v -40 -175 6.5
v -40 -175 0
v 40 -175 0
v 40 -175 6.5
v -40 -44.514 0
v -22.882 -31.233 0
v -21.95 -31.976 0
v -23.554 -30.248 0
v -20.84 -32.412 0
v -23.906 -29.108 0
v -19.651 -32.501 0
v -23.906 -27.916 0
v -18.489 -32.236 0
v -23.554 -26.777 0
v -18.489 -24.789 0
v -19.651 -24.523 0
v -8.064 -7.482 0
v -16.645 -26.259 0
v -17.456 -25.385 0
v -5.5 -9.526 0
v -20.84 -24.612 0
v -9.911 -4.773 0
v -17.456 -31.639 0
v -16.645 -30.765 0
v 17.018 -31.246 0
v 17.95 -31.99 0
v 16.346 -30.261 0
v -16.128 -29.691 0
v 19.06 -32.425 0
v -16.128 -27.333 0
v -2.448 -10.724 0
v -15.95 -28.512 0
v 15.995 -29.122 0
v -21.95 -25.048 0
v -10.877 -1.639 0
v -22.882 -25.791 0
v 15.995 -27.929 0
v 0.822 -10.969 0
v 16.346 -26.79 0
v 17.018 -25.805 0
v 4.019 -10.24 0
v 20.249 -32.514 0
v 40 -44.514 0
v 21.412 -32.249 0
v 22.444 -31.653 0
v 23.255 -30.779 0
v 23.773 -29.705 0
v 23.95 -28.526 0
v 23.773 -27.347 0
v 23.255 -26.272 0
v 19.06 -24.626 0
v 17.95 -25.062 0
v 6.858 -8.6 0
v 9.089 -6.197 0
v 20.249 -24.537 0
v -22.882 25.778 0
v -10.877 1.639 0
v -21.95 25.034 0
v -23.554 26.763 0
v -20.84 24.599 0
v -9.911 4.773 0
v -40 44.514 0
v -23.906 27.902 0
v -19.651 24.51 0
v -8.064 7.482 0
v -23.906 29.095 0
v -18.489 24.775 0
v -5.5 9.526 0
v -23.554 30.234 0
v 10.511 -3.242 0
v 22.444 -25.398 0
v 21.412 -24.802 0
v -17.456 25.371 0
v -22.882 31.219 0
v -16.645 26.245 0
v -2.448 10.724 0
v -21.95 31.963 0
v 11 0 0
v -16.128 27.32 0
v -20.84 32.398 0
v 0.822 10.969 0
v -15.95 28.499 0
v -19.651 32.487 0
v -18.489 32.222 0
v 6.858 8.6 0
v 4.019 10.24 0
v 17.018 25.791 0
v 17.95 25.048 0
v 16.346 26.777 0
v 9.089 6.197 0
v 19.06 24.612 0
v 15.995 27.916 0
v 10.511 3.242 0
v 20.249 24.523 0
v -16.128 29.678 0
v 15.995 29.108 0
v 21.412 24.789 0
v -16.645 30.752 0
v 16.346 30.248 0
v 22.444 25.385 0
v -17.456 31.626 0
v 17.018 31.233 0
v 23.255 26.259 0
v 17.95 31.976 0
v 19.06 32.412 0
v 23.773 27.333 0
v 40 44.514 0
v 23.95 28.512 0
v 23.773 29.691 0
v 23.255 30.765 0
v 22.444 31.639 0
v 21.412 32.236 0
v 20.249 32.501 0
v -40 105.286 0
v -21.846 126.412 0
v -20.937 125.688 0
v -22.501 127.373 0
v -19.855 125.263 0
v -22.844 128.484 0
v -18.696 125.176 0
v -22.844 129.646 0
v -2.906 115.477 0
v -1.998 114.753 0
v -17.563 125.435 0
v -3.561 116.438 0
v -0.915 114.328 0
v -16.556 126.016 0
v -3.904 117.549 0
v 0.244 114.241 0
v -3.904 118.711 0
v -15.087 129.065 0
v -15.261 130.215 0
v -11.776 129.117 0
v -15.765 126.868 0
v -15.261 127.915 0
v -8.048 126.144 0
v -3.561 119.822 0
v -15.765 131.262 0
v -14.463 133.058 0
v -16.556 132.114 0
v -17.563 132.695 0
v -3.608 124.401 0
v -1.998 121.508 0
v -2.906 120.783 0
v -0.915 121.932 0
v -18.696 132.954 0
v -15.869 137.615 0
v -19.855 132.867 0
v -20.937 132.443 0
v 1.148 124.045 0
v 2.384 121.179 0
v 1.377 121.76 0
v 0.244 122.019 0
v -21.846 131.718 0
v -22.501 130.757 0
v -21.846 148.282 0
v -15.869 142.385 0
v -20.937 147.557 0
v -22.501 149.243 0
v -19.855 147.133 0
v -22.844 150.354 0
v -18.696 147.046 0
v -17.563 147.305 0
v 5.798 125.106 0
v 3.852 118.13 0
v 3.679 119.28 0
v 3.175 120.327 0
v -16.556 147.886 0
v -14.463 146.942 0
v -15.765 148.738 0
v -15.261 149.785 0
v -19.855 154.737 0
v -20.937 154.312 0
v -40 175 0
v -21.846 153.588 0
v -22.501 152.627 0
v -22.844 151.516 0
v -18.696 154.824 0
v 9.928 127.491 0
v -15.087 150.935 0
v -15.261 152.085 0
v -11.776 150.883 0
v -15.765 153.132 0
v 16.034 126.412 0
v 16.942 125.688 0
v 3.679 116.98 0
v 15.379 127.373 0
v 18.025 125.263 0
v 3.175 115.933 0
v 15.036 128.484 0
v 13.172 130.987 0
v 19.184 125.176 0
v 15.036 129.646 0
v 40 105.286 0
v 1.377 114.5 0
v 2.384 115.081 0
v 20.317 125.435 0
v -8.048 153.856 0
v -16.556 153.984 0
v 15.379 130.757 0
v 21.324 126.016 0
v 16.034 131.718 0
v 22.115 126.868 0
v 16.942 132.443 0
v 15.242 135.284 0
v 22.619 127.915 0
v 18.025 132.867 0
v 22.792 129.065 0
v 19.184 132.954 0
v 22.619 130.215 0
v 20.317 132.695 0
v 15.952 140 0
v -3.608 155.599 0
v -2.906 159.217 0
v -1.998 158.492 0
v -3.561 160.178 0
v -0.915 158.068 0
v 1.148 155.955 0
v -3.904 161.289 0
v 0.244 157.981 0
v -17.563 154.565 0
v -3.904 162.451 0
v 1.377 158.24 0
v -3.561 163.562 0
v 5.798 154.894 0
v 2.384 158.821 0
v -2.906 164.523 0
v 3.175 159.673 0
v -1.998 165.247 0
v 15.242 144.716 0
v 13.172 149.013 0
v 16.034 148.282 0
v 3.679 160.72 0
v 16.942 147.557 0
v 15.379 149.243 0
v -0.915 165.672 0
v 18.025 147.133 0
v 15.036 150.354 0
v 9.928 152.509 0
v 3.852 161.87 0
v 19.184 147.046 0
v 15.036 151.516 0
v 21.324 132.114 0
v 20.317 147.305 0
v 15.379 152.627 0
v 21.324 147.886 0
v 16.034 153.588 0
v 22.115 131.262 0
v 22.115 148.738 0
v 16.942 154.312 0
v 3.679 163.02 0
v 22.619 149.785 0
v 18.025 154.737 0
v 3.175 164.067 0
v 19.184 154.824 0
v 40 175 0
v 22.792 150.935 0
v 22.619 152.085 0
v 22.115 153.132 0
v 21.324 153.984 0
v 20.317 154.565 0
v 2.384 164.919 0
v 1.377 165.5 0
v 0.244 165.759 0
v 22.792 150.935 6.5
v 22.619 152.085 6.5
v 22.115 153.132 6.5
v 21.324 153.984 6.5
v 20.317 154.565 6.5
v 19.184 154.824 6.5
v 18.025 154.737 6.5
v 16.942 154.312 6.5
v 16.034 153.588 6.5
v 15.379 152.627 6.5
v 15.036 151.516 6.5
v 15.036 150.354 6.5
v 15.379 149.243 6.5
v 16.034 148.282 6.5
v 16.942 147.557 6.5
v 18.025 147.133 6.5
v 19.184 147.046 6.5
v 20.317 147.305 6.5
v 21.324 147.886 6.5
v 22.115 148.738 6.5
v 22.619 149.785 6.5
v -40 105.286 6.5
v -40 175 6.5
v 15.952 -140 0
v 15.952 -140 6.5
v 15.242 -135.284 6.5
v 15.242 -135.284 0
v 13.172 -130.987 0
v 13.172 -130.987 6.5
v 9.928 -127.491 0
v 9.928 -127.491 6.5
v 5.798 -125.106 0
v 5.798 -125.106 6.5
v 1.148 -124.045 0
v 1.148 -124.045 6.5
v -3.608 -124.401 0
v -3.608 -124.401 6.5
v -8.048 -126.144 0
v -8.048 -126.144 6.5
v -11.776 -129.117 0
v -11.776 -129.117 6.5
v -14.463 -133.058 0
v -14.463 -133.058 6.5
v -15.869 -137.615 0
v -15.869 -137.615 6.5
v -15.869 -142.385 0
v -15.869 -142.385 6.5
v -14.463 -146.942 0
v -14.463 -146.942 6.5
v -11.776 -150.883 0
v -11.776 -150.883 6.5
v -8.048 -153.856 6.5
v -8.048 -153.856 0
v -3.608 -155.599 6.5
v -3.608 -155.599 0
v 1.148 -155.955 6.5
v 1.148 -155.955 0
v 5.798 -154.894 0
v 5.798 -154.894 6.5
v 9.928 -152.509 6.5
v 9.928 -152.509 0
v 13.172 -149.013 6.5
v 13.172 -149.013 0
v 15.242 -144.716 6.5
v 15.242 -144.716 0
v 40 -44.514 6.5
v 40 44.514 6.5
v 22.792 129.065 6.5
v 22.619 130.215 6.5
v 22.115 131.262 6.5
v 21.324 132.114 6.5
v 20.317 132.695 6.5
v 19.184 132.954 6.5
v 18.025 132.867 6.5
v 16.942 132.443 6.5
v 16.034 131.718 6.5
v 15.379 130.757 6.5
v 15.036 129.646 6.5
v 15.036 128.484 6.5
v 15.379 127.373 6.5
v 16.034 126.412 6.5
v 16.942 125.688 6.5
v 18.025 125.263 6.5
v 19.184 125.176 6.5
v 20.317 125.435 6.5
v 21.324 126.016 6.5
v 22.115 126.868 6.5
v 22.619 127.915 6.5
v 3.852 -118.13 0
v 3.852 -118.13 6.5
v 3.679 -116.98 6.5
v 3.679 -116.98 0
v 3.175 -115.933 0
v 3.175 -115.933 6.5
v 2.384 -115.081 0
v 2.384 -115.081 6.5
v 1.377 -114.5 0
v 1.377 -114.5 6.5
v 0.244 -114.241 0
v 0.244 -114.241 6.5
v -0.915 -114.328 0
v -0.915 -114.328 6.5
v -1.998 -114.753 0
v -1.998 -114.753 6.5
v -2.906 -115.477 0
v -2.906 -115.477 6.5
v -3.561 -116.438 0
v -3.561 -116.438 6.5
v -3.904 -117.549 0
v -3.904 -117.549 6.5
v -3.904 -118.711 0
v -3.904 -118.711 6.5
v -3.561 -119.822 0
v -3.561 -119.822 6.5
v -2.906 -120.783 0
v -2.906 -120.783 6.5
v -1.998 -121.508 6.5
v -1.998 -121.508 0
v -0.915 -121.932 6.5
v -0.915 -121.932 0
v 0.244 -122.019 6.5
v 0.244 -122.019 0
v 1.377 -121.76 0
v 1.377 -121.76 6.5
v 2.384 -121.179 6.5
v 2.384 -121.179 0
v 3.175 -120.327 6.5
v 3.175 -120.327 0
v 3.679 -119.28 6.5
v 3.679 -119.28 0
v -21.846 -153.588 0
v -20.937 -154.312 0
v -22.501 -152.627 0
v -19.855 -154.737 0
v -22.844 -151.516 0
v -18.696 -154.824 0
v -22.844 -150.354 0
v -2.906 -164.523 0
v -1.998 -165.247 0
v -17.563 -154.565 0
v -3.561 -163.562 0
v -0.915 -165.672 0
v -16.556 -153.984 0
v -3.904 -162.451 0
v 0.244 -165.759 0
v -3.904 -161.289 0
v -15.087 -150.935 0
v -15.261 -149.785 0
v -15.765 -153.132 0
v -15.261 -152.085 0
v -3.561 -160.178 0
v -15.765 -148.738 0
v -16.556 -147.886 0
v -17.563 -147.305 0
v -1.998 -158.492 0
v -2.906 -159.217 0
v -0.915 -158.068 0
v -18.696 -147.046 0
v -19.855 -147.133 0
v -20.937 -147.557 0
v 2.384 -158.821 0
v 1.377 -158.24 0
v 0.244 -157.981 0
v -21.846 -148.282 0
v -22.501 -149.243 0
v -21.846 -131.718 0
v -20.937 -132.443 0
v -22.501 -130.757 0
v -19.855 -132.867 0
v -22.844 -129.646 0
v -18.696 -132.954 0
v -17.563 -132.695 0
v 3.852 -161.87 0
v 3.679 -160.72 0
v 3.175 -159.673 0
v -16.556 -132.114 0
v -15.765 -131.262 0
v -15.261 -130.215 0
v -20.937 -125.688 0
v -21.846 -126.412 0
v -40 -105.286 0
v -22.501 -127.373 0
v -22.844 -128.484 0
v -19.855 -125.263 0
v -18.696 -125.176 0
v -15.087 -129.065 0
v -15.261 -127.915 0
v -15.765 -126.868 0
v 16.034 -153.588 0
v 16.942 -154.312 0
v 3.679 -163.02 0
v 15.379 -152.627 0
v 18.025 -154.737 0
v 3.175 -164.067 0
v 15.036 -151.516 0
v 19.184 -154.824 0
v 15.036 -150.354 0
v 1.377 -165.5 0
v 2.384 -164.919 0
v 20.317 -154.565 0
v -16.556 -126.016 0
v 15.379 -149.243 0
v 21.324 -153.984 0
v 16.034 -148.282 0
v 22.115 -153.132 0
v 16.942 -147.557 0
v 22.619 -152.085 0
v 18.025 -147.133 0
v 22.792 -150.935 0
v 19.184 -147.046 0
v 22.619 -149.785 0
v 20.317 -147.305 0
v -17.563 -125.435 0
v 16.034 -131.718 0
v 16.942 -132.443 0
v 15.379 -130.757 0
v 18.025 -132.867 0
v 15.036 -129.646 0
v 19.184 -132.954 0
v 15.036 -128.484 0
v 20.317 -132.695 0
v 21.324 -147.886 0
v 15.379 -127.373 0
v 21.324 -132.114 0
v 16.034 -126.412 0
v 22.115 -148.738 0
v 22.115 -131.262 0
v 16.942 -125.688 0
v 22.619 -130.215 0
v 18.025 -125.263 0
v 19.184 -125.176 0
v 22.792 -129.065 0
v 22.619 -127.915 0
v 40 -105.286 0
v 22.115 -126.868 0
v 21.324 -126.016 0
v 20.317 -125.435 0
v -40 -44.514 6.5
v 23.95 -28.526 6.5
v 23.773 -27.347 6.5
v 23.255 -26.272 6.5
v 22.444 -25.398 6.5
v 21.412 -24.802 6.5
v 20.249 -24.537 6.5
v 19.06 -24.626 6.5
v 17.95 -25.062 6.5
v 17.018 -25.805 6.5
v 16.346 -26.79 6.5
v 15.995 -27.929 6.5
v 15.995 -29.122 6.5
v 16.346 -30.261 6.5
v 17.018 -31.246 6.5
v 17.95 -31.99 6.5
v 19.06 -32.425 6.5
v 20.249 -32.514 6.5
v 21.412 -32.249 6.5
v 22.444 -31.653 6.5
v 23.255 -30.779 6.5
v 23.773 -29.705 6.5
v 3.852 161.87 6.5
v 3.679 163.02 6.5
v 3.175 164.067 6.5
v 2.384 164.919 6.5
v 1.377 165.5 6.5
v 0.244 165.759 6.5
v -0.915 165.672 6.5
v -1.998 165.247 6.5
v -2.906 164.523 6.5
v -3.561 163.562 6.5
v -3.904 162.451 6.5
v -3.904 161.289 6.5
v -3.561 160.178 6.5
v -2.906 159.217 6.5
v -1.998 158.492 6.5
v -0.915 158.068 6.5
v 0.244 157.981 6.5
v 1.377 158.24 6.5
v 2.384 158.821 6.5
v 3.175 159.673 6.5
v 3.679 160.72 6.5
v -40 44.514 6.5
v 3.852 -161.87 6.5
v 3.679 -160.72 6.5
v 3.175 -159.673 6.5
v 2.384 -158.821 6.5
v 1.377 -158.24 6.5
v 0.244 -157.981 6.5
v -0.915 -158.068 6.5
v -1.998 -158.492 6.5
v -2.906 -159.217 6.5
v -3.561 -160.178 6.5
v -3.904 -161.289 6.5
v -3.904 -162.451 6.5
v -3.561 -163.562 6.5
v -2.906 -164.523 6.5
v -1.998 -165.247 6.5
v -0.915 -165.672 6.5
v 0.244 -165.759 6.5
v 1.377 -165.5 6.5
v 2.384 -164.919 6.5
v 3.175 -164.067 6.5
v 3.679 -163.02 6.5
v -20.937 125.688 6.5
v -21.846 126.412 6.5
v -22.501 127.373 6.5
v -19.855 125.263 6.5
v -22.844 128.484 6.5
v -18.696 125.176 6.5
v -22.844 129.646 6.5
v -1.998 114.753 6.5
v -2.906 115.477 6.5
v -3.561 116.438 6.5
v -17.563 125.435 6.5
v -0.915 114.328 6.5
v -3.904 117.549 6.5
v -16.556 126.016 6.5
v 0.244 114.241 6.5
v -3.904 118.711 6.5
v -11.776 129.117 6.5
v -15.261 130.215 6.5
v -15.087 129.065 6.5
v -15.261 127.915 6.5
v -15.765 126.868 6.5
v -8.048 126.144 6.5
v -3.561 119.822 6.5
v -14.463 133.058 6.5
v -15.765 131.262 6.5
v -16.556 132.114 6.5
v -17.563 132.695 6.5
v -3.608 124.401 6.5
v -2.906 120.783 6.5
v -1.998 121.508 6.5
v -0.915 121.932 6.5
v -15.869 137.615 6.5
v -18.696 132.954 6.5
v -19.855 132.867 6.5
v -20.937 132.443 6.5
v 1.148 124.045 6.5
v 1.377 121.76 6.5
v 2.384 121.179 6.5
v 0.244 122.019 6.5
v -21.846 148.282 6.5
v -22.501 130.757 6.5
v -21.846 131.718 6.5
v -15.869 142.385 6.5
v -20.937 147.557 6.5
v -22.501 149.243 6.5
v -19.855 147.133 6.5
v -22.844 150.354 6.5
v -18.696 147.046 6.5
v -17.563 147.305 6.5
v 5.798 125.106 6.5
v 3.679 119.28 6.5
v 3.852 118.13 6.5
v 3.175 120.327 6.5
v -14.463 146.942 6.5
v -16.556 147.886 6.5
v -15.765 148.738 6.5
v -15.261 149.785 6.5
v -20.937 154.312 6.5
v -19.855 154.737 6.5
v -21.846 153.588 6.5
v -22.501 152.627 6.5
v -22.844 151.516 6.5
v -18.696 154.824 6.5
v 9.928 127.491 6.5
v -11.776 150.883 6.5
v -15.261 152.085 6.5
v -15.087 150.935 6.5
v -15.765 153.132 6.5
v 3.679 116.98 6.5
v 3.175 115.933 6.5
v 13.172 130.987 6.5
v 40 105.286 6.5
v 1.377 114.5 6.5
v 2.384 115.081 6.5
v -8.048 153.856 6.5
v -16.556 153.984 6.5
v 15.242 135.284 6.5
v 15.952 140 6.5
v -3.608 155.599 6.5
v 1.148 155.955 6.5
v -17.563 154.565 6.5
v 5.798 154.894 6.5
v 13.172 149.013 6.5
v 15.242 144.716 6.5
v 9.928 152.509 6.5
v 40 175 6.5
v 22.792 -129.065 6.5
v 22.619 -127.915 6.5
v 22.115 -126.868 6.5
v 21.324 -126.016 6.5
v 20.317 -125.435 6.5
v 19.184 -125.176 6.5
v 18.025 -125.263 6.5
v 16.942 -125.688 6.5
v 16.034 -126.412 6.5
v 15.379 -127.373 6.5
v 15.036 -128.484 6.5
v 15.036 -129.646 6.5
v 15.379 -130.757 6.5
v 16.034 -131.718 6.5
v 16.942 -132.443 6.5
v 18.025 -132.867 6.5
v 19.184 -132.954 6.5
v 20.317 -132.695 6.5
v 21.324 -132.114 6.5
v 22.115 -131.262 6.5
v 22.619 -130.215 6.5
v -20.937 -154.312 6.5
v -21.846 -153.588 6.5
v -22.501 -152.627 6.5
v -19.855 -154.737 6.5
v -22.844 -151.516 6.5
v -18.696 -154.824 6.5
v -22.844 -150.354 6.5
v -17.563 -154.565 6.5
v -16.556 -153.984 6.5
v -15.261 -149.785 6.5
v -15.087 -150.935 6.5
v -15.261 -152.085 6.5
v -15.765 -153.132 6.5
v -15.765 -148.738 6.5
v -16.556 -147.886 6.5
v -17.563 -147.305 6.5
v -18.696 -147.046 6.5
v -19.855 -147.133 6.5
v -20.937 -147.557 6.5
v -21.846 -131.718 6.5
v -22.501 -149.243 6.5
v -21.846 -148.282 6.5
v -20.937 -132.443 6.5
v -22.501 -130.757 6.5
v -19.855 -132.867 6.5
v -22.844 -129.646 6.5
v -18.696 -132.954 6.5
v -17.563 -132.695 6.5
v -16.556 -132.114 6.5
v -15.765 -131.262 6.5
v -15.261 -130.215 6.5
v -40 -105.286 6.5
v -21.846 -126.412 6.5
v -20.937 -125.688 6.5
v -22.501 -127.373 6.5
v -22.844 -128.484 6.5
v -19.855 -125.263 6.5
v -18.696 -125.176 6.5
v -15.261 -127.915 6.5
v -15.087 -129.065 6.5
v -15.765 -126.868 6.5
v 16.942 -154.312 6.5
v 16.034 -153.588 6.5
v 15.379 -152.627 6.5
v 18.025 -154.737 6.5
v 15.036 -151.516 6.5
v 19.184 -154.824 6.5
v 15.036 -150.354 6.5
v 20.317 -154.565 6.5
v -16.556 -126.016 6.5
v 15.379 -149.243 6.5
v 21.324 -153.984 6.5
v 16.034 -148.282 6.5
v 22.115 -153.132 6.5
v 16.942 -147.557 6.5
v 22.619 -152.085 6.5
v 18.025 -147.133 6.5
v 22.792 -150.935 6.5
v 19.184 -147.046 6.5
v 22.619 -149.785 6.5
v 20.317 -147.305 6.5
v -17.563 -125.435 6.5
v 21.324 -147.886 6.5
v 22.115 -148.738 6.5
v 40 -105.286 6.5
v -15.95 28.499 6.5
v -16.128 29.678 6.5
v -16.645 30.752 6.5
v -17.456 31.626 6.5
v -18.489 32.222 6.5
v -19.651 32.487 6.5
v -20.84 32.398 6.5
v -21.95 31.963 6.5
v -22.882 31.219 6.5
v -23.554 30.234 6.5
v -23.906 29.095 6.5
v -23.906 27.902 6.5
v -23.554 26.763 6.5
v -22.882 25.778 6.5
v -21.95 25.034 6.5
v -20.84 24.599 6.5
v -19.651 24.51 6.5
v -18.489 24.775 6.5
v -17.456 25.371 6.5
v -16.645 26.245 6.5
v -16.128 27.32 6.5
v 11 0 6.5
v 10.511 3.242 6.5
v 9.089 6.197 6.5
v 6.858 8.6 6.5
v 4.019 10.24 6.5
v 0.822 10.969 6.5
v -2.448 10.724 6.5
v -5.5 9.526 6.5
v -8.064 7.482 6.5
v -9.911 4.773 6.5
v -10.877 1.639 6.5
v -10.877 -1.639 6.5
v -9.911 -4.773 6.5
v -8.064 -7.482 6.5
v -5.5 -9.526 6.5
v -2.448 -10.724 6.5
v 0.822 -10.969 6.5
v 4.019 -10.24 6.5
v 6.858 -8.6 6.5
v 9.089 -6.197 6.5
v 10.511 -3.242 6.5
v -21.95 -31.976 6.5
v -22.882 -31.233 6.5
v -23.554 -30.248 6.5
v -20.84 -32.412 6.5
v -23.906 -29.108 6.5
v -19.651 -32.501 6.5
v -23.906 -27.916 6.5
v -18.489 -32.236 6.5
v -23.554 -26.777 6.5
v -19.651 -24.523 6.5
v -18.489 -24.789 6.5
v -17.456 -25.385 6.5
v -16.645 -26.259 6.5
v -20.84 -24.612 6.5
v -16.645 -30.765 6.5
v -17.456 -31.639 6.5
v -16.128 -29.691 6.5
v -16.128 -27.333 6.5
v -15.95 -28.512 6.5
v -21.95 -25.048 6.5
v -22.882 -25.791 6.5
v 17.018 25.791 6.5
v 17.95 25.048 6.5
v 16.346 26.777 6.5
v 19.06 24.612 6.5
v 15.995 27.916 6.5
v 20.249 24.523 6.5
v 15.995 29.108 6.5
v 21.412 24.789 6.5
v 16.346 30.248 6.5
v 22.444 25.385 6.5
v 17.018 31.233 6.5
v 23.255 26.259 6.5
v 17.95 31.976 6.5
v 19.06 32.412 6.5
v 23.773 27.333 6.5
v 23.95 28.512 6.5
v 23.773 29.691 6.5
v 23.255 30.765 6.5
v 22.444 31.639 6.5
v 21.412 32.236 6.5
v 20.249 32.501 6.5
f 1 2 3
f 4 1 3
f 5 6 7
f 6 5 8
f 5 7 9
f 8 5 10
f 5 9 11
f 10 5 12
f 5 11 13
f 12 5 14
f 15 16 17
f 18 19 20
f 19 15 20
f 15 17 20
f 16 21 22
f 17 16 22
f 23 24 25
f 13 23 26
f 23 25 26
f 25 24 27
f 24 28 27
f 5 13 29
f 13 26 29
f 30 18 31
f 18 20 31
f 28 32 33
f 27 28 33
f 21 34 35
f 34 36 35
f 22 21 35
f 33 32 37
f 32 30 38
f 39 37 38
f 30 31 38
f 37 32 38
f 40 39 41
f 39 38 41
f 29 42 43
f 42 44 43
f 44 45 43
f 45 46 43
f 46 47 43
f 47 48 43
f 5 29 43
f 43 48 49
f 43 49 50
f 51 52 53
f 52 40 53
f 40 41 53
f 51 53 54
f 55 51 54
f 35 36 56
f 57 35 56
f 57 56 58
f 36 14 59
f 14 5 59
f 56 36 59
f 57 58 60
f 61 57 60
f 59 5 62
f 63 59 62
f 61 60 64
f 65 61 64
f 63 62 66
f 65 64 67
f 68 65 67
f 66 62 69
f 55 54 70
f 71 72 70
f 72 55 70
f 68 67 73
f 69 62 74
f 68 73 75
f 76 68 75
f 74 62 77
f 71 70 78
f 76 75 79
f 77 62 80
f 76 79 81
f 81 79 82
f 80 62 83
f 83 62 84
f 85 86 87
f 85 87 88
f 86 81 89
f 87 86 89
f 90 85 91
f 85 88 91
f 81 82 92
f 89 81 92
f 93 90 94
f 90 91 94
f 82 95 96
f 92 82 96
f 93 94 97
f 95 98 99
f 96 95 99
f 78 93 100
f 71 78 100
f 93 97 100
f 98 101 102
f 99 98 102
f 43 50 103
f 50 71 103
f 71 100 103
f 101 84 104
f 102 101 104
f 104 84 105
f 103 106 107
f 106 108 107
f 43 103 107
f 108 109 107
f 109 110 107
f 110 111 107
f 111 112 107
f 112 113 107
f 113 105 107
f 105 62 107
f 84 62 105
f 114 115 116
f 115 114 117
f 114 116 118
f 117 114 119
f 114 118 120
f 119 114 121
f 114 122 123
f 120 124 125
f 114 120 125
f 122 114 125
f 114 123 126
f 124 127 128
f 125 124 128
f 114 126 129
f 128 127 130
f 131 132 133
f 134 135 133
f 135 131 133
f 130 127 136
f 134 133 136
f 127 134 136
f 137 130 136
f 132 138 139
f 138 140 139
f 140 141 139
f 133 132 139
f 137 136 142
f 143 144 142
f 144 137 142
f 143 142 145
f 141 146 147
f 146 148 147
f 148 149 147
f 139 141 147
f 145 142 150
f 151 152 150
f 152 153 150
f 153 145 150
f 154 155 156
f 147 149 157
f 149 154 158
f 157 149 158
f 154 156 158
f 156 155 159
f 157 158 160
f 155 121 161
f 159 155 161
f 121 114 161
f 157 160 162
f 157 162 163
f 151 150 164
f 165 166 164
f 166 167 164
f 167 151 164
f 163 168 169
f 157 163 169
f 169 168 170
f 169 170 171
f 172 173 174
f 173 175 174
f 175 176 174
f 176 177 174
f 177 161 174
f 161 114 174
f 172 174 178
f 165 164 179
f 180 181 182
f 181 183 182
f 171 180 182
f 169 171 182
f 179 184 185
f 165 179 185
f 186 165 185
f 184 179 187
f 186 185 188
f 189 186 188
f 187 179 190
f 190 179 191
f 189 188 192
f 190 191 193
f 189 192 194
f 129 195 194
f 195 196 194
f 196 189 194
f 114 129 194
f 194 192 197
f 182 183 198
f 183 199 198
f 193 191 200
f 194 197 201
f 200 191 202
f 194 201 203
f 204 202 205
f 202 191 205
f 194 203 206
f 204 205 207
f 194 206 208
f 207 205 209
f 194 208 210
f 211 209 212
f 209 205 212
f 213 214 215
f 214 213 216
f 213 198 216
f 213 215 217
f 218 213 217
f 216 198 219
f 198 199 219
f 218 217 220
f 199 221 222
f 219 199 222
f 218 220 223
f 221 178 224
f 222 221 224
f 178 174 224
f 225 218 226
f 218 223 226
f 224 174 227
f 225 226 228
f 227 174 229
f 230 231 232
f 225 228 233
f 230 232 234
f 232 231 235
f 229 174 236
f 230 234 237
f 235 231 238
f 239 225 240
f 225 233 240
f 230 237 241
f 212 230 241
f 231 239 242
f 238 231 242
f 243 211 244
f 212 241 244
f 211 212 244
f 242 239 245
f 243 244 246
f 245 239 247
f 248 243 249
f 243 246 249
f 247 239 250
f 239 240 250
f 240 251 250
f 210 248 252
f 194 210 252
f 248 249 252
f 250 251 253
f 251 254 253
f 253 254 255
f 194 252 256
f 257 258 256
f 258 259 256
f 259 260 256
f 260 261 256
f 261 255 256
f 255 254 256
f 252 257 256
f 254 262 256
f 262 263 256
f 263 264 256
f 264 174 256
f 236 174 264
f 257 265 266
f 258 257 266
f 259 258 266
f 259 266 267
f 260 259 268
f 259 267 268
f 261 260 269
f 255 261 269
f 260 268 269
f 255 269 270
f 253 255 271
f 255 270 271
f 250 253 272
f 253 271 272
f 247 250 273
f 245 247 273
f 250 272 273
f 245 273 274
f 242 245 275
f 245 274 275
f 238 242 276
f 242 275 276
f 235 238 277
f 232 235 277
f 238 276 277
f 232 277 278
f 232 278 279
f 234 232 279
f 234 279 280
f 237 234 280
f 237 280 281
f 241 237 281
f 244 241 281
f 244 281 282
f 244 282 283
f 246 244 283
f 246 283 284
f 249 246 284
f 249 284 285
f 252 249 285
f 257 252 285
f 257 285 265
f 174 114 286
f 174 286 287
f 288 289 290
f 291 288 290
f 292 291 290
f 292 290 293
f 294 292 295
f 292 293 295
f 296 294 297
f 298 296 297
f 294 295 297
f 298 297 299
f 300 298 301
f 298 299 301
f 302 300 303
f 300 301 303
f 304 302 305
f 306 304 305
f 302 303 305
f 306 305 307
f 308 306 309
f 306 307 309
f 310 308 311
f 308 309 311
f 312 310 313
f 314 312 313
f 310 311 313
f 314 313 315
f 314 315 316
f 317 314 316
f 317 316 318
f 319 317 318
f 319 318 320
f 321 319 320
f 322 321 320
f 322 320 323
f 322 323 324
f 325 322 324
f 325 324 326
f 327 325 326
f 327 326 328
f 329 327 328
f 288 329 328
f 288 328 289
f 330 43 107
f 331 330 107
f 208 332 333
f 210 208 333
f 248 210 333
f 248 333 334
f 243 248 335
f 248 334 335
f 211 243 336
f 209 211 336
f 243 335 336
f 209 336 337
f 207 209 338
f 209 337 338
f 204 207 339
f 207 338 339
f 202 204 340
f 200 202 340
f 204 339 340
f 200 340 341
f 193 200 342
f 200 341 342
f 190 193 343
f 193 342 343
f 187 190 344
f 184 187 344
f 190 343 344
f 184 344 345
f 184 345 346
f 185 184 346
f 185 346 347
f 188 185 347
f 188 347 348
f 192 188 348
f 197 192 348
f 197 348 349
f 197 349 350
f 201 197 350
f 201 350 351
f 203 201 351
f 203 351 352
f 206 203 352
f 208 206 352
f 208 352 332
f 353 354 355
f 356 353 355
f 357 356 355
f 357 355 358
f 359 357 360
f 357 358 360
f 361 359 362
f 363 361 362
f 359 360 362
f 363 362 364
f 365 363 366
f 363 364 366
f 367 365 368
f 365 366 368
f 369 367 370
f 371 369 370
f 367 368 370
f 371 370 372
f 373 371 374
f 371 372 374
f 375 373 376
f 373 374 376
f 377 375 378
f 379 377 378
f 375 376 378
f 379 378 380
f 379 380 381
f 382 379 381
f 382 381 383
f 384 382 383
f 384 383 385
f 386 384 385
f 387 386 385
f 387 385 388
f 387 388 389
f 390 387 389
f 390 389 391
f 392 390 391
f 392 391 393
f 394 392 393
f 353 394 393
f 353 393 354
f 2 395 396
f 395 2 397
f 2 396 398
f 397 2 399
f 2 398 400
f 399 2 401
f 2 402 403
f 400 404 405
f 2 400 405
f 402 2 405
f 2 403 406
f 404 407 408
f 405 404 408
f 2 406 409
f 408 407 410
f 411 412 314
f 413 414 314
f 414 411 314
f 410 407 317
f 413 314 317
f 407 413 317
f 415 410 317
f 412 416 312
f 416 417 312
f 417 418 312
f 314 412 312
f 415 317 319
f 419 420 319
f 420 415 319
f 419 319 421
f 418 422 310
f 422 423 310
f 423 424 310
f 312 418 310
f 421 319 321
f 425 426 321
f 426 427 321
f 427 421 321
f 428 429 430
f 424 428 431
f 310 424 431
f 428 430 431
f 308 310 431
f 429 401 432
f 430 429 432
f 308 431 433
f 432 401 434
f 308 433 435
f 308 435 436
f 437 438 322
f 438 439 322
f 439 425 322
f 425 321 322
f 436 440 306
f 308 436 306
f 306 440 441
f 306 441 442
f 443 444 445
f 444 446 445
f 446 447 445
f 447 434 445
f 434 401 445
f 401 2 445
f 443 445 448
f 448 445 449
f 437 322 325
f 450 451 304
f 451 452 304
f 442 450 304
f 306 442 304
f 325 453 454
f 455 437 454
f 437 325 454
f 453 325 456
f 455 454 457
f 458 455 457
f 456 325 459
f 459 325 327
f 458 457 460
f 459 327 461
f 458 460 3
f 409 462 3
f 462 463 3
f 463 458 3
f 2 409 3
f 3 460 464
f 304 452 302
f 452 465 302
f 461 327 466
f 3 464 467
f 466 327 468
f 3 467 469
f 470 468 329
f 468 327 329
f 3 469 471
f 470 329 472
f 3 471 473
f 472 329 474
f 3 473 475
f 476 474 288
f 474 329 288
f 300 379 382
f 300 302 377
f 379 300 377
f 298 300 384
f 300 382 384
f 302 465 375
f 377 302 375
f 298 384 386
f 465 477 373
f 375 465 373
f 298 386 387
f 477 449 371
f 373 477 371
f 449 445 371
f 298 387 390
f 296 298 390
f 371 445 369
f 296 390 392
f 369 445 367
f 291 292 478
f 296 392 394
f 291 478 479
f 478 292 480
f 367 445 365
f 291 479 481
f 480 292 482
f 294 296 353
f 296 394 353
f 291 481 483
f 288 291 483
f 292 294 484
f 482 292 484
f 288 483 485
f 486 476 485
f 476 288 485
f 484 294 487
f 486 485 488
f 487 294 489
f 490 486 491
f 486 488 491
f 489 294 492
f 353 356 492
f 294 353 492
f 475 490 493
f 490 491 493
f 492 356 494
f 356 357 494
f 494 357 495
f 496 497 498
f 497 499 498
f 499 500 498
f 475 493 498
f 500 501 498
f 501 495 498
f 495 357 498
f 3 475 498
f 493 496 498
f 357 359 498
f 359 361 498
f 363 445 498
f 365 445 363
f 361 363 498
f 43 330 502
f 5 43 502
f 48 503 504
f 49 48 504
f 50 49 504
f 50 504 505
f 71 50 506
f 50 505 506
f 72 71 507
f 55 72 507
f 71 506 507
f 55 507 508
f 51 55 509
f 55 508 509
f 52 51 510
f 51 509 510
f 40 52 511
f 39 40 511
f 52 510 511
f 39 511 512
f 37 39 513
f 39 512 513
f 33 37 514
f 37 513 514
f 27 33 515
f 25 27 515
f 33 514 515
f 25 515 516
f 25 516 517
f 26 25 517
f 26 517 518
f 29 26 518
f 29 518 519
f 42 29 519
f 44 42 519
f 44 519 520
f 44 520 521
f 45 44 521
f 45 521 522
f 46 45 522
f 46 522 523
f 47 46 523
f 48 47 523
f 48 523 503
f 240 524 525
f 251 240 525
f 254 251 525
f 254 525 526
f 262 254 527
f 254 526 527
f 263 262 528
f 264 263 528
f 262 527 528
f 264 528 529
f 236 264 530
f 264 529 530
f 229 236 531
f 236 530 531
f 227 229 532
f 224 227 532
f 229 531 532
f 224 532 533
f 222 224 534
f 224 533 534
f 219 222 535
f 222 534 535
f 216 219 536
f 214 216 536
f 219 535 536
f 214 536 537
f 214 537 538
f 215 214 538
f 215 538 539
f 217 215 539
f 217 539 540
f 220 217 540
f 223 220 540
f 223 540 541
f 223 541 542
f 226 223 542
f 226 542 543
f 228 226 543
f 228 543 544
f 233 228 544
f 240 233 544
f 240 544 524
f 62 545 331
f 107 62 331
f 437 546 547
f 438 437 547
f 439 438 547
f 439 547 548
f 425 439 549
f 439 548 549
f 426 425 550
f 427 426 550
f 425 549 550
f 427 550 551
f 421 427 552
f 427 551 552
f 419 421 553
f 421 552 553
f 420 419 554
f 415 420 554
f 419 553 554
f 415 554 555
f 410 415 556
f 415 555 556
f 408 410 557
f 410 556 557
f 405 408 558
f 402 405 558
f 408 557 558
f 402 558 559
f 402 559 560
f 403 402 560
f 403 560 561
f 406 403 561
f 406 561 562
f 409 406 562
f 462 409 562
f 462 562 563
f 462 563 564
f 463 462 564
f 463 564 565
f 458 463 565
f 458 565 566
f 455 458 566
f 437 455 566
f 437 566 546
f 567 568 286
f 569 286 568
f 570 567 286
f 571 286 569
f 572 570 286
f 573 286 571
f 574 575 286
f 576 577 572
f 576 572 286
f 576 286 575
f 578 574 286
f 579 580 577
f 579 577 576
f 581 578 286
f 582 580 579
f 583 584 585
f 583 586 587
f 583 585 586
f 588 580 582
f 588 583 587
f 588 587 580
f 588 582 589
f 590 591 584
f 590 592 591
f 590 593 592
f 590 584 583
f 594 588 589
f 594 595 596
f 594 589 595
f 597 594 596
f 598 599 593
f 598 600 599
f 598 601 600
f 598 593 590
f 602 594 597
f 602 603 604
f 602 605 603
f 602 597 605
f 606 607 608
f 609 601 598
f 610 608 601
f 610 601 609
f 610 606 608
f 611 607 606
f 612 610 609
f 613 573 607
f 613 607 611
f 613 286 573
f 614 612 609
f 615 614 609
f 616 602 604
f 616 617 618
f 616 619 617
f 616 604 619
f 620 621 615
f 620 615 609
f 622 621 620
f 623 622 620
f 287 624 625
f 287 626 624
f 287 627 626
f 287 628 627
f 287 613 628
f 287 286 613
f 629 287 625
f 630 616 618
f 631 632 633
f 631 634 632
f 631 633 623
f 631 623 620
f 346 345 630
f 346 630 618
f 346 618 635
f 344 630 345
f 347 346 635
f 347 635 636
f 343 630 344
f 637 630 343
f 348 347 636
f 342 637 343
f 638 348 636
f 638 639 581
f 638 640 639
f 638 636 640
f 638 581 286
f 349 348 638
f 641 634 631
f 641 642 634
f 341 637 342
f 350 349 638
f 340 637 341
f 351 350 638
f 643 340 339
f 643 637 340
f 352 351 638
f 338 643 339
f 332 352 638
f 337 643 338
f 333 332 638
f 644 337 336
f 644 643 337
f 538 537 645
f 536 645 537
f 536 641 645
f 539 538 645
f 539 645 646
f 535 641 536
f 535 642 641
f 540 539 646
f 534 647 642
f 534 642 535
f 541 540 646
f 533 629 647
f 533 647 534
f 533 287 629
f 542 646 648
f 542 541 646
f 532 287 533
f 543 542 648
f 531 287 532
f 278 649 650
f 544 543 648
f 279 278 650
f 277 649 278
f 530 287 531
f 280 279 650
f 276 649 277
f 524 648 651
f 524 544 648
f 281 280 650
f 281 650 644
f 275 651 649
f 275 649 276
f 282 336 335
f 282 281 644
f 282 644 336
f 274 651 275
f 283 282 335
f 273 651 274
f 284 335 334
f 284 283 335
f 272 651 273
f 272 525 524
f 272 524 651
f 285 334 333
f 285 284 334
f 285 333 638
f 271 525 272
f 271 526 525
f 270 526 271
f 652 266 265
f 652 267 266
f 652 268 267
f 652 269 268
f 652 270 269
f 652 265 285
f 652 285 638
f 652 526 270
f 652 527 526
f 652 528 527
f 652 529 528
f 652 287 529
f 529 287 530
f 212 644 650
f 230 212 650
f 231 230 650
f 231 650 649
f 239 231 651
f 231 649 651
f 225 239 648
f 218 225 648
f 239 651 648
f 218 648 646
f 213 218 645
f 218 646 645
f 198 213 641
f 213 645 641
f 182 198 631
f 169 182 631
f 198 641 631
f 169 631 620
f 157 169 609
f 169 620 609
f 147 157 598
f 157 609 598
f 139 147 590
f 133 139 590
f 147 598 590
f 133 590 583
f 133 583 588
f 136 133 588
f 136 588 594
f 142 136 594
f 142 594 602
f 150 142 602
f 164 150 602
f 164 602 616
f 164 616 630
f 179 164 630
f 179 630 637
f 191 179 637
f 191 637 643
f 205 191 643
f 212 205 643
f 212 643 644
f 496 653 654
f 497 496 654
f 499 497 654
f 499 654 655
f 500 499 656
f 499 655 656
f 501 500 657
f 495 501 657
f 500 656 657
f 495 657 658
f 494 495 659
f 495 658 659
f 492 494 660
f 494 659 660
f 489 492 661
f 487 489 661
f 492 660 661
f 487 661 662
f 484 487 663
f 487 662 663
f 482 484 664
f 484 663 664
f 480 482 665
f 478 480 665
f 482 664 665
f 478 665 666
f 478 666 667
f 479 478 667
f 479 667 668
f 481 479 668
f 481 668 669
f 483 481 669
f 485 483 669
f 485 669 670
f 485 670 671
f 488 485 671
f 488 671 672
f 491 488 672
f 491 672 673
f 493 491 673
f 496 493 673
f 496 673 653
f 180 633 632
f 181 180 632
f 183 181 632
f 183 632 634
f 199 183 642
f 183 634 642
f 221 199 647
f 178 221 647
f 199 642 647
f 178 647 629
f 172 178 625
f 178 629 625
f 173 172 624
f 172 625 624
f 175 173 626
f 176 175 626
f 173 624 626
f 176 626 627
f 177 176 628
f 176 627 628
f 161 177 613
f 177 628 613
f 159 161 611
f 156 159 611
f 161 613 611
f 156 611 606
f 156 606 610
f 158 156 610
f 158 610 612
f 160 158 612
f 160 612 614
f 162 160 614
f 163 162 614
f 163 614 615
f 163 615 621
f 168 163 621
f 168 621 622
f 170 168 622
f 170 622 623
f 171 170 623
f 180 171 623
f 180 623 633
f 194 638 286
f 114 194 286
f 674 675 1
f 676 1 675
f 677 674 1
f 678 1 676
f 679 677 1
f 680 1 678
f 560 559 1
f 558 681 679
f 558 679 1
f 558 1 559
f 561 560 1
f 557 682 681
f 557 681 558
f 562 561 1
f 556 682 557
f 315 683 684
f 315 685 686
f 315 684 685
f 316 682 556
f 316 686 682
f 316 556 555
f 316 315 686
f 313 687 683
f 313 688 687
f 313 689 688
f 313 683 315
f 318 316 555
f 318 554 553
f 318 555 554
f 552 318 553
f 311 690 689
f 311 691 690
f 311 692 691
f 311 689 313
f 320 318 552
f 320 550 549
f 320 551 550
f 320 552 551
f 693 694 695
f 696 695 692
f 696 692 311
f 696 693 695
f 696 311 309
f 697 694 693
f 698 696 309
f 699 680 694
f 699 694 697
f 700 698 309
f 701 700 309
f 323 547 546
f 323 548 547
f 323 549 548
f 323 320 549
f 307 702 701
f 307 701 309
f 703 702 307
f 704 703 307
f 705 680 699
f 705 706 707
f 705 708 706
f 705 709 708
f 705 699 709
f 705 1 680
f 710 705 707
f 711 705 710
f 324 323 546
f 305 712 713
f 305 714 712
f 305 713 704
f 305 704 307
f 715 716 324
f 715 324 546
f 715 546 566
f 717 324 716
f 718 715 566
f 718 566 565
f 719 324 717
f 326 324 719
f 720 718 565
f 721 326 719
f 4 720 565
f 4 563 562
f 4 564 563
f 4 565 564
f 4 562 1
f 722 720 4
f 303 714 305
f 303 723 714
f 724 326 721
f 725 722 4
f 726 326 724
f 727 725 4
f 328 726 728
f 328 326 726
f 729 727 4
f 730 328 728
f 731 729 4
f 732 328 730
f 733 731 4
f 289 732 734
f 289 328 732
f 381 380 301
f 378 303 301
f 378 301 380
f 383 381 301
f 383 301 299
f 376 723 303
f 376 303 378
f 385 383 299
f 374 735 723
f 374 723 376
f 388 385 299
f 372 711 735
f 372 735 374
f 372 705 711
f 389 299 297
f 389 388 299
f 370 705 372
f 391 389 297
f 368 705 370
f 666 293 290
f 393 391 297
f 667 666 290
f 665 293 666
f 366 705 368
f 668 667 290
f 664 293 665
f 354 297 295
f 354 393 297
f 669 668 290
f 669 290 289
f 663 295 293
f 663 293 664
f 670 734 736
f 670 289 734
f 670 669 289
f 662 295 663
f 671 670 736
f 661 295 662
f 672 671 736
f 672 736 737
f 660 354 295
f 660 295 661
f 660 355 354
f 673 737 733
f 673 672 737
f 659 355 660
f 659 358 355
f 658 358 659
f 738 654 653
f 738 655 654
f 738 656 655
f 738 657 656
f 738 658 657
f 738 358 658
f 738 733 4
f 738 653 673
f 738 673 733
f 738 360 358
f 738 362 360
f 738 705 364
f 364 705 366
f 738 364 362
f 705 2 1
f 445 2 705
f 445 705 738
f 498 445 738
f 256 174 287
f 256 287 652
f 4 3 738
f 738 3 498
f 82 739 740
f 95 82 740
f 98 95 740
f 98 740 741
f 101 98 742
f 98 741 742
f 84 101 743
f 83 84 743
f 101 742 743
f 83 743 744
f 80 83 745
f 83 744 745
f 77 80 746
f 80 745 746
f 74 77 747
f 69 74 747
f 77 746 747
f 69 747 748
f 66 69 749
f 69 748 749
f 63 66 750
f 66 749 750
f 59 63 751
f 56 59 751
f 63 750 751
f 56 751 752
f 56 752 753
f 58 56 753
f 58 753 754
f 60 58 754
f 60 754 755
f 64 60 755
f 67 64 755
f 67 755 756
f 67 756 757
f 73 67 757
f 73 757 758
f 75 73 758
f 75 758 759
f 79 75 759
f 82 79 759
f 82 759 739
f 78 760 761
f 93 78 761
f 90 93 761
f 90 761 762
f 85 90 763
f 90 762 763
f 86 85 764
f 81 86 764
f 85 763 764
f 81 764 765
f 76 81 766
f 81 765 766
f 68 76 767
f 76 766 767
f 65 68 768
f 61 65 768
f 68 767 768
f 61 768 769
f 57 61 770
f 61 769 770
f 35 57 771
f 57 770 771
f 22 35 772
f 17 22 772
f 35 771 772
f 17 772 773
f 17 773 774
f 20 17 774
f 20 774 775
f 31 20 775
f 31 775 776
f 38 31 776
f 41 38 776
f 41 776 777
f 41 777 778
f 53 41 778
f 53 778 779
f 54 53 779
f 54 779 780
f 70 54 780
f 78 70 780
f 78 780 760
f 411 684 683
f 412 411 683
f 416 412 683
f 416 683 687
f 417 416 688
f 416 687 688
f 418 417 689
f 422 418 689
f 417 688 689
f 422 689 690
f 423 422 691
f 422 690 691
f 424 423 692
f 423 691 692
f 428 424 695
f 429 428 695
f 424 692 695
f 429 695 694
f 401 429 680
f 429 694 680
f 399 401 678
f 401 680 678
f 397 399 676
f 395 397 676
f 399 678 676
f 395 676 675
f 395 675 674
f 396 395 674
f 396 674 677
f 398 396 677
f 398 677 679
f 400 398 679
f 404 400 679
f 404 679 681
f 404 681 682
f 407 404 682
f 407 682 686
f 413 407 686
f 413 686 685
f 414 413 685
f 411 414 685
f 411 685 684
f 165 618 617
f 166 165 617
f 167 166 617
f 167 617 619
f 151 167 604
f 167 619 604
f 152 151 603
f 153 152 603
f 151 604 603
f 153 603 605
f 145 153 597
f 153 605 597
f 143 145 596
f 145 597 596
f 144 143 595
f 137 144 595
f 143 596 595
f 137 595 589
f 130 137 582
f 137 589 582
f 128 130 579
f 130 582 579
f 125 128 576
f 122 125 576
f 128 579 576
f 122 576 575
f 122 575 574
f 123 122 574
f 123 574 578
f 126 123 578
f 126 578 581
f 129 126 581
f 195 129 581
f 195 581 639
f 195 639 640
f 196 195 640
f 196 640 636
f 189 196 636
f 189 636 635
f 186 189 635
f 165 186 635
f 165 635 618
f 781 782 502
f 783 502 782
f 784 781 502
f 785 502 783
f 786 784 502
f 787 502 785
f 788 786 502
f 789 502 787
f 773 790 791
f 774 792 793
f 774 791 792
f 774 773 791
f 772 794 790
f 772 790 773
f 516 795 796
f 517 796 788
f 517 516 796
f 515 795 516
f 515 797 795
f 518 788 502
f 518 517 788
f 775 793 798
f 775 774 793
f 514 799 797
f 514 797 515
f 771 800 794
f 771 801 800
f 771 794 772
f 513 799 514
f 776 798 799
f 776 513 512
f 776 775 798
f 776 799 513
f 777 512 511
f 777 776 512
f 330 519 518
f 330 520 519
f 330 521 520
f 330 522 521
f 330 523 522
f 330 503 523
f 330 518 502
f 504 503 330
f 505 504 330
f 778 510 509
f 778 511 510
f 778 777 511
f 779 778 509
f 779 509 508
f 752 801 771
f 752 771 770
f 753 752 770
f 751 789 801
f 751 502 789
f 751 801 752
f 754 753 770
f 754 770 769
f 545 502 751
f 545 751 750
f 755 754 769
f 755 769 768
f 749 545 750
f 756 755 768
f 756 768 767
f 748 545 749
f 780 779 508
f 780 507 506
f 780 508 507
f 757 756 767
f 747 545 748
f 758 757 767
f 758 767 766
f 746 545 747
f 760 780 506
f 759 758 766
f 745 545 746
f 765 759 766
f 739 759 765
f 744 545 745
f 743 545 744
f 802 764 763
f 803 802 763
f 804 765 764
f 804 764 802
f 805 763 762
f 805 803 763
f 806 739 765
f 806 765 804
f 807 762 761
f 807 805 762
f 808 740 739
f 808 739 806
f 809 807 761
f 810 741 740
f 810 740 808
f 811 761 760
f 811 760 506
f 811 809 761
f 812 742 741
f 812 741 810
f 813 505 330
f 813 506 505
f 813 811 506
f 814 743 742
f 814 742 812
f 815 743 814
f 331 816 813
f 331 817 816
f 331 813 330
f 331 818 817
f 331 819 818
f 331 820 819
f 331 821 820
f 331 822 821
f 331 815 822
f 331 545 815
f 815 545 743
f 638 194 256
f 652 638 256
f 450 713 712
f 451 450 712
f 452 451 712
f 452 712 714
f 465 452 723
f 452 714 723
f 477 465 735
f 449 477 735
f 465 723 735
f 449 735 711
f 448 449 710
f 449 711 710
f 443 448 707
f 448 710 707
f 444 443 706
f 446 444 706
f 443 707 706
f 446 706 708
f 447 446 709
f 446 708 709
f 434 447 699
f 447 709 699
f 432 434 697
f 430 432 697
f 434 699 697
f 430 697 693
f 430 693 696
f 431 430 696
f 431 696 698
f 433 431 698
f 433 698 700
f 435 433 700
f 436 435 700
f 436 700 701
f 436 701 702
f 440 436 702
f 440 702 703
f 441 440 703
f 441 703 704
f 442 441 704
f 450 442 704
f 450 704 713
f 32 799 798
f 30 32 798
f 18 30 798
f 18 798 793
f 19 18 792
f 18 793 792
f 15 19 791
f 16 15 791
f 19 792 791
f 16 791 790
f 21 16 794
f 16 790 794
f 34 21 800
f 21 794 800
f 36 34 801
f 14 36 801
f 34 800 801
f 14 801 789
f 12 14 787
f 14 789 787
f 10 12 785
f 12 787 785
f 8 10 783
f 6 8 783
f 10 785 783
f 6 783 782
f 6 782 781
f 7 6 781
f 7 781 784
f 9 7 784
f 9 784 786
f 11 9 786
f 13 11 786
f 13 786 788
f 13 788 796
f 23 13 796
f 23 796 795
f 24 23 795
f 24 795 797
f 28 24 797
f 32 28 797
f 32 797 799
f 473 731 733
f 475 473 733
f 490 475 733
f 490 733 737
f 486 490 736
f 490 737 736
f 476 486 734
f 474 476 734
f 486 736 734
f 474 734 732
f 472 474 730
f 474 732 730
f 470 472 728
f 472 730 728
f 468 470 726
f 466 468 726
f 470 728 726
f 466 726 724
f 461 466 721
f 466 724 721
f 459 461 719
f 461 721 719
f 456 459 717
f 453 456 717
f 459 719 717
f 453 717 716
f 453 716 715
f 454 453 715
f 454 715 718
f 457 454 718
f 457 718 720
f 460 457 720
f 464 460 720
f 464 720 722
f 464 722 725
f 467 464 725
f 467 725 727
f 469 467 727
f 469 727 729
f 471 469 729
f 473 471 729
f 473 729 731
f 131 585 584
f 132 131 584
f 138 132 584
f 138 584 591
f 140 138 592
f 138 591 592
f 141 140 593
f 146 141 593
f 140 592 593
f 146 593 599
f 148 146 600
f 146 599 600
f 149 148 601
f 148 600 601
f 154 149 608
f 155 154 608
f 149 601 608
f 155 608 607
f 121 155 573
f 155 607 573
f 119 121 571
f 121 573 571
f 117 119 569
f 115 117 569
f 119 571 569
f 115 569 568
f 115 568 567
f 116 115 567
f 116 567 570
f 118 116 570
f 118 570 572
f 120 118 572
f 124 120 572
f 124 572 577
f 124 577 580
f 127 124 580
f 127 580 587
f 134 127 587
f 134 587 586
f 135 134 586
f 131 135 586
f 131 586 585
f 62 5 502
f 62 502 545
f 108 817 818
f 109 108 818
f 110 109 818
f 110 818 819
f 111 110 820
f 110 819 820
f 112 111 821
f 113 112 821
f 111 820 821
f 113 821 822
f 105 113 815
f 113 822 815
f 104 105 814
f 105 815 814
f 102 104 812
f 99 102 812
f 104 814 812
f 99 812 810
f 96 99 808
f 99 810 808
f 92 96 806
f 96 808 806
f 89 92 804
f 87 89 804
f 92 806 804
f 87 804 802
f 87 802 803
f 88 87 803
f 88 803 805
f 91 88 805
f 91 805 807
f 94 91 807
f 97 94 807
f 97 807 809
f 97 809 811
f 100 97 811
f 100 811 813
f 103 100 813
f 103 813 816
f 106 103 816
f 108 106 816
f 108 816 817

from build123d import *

# Parameters (mm, degrees)
SKETCH2_W           = 80
SKETCH2_H           = 350
BOSS_EXTRUDE1_DEPTH = 6.5
SKETCH3_R           = 11
SKETCH3_R_2         = 16
SKETCH3_R_3         = 3.9
SKETCH3_R_4         = 4
CUT_EXTRUDE1_DEPTH  = 7.5
CUT_EXTRUDE2_DEPTH  = 7.5


with BuildPart() as part:
    # Sketch2 → Boss-Extrude1 (new body)
    with BuildSketch(Plane.XY):
        Rectangle(SKETCH2_W, SKETCH2_H)
    extrude(amount=BOSS_EXTRUDE1_DEPTH)

    # Sketch3 → Cut-Extrude1 (cut, through all)
    with BuildSketch(Plane.XY.offset(6.5)):
        Circle(SKETCH3_R)
        with Locations((-0.047536851, 140)):
            Circle(SKETCH3_R_2)
        with Locations((-0.047536851, -140)):
            Circle(SKETCH3_R_2)
        with Locations((-0.047536851, 118.130030835)):
            Circle(SKETCH3_R_3)
        with Locations((-18.987485728, 129.065015417)):
            Circle(SKETCH3_R_3)
        with Locations((-18.987485728, 150.934984583)):
            Circle(SKETCH3_R_3)
        with Locations((-0.047536851, 161.869969165)):
            Circle(SKETCH3_R_3)
        with Locations((18.892412027, 150.934984583)):
            Circle(SKETCH3_R_3)
        with Locations((18.892412027, 129.065015417)):
            Circle(SKETCH3_R_3)
        with Locations((18.892412027, -129.065015417)):
            Circle(SKETCH3_R_3)
        with Locations((18.892412027, -150.934984583)):
            Circle(SKETCH3_R_3)
        with Locations((-0.047536851, -161.869969165)):
            Circle(SKETCH3_R_3)
        with Locations((-18.987485728, -150.934984583)):
            Circle(SKETCH3_R_3)
        with Locations((-18.987485728, -129.065015417)):
            Circle(SKETCH3_R_3)
        with Locations((-0.047536851, -118.130030835)):
            Circle(SKETCH3_R_3)
        with Locations((19.950260187, 28.512090355)):
            Circle(SKETCH3_R_4)
        with Locations((-19.950260187, 28.498542176)):
            Circle(SKETCH3_R_4)
        with Locations((19.950260187, -28.525638534)):
            Circle(SKETCH3_R_4)
        with Locations((-19.950260187, -28.512090355)):
            Circle(SKETCH3_R_4)
    extrude(amount=-CUT_EXTRUDE1_DEPTH, mode=Mode.SUBTRACT)

    # Sketch4 → Cut-Extrude2 (cut, through all)
    with BuildSketch(Plane.XY.offset(6.5)):
        Polygon((-68.864439422, 44.514191981), (-41.075494308, 44.514191981), (41.075494308, 44.514191981), (68.816902572, 44.514191981), (68.816902572, 105.285938424), (-68.864439422, 105.285938424), align=None)
        Polygon((41.075494308, -44.514191981), (-41.075494308, -44.514191981), (-68.864439422, -44.514191981), (-68.864439422, -105.285938424), (68.816902572, -105.285938424), (68.816902572, -44.514191981), align=None)
    extrude(amount=-CUT_EXTRUDE2_DEPTH, mode=Mode.SUBTRACT)


solid = part.part
